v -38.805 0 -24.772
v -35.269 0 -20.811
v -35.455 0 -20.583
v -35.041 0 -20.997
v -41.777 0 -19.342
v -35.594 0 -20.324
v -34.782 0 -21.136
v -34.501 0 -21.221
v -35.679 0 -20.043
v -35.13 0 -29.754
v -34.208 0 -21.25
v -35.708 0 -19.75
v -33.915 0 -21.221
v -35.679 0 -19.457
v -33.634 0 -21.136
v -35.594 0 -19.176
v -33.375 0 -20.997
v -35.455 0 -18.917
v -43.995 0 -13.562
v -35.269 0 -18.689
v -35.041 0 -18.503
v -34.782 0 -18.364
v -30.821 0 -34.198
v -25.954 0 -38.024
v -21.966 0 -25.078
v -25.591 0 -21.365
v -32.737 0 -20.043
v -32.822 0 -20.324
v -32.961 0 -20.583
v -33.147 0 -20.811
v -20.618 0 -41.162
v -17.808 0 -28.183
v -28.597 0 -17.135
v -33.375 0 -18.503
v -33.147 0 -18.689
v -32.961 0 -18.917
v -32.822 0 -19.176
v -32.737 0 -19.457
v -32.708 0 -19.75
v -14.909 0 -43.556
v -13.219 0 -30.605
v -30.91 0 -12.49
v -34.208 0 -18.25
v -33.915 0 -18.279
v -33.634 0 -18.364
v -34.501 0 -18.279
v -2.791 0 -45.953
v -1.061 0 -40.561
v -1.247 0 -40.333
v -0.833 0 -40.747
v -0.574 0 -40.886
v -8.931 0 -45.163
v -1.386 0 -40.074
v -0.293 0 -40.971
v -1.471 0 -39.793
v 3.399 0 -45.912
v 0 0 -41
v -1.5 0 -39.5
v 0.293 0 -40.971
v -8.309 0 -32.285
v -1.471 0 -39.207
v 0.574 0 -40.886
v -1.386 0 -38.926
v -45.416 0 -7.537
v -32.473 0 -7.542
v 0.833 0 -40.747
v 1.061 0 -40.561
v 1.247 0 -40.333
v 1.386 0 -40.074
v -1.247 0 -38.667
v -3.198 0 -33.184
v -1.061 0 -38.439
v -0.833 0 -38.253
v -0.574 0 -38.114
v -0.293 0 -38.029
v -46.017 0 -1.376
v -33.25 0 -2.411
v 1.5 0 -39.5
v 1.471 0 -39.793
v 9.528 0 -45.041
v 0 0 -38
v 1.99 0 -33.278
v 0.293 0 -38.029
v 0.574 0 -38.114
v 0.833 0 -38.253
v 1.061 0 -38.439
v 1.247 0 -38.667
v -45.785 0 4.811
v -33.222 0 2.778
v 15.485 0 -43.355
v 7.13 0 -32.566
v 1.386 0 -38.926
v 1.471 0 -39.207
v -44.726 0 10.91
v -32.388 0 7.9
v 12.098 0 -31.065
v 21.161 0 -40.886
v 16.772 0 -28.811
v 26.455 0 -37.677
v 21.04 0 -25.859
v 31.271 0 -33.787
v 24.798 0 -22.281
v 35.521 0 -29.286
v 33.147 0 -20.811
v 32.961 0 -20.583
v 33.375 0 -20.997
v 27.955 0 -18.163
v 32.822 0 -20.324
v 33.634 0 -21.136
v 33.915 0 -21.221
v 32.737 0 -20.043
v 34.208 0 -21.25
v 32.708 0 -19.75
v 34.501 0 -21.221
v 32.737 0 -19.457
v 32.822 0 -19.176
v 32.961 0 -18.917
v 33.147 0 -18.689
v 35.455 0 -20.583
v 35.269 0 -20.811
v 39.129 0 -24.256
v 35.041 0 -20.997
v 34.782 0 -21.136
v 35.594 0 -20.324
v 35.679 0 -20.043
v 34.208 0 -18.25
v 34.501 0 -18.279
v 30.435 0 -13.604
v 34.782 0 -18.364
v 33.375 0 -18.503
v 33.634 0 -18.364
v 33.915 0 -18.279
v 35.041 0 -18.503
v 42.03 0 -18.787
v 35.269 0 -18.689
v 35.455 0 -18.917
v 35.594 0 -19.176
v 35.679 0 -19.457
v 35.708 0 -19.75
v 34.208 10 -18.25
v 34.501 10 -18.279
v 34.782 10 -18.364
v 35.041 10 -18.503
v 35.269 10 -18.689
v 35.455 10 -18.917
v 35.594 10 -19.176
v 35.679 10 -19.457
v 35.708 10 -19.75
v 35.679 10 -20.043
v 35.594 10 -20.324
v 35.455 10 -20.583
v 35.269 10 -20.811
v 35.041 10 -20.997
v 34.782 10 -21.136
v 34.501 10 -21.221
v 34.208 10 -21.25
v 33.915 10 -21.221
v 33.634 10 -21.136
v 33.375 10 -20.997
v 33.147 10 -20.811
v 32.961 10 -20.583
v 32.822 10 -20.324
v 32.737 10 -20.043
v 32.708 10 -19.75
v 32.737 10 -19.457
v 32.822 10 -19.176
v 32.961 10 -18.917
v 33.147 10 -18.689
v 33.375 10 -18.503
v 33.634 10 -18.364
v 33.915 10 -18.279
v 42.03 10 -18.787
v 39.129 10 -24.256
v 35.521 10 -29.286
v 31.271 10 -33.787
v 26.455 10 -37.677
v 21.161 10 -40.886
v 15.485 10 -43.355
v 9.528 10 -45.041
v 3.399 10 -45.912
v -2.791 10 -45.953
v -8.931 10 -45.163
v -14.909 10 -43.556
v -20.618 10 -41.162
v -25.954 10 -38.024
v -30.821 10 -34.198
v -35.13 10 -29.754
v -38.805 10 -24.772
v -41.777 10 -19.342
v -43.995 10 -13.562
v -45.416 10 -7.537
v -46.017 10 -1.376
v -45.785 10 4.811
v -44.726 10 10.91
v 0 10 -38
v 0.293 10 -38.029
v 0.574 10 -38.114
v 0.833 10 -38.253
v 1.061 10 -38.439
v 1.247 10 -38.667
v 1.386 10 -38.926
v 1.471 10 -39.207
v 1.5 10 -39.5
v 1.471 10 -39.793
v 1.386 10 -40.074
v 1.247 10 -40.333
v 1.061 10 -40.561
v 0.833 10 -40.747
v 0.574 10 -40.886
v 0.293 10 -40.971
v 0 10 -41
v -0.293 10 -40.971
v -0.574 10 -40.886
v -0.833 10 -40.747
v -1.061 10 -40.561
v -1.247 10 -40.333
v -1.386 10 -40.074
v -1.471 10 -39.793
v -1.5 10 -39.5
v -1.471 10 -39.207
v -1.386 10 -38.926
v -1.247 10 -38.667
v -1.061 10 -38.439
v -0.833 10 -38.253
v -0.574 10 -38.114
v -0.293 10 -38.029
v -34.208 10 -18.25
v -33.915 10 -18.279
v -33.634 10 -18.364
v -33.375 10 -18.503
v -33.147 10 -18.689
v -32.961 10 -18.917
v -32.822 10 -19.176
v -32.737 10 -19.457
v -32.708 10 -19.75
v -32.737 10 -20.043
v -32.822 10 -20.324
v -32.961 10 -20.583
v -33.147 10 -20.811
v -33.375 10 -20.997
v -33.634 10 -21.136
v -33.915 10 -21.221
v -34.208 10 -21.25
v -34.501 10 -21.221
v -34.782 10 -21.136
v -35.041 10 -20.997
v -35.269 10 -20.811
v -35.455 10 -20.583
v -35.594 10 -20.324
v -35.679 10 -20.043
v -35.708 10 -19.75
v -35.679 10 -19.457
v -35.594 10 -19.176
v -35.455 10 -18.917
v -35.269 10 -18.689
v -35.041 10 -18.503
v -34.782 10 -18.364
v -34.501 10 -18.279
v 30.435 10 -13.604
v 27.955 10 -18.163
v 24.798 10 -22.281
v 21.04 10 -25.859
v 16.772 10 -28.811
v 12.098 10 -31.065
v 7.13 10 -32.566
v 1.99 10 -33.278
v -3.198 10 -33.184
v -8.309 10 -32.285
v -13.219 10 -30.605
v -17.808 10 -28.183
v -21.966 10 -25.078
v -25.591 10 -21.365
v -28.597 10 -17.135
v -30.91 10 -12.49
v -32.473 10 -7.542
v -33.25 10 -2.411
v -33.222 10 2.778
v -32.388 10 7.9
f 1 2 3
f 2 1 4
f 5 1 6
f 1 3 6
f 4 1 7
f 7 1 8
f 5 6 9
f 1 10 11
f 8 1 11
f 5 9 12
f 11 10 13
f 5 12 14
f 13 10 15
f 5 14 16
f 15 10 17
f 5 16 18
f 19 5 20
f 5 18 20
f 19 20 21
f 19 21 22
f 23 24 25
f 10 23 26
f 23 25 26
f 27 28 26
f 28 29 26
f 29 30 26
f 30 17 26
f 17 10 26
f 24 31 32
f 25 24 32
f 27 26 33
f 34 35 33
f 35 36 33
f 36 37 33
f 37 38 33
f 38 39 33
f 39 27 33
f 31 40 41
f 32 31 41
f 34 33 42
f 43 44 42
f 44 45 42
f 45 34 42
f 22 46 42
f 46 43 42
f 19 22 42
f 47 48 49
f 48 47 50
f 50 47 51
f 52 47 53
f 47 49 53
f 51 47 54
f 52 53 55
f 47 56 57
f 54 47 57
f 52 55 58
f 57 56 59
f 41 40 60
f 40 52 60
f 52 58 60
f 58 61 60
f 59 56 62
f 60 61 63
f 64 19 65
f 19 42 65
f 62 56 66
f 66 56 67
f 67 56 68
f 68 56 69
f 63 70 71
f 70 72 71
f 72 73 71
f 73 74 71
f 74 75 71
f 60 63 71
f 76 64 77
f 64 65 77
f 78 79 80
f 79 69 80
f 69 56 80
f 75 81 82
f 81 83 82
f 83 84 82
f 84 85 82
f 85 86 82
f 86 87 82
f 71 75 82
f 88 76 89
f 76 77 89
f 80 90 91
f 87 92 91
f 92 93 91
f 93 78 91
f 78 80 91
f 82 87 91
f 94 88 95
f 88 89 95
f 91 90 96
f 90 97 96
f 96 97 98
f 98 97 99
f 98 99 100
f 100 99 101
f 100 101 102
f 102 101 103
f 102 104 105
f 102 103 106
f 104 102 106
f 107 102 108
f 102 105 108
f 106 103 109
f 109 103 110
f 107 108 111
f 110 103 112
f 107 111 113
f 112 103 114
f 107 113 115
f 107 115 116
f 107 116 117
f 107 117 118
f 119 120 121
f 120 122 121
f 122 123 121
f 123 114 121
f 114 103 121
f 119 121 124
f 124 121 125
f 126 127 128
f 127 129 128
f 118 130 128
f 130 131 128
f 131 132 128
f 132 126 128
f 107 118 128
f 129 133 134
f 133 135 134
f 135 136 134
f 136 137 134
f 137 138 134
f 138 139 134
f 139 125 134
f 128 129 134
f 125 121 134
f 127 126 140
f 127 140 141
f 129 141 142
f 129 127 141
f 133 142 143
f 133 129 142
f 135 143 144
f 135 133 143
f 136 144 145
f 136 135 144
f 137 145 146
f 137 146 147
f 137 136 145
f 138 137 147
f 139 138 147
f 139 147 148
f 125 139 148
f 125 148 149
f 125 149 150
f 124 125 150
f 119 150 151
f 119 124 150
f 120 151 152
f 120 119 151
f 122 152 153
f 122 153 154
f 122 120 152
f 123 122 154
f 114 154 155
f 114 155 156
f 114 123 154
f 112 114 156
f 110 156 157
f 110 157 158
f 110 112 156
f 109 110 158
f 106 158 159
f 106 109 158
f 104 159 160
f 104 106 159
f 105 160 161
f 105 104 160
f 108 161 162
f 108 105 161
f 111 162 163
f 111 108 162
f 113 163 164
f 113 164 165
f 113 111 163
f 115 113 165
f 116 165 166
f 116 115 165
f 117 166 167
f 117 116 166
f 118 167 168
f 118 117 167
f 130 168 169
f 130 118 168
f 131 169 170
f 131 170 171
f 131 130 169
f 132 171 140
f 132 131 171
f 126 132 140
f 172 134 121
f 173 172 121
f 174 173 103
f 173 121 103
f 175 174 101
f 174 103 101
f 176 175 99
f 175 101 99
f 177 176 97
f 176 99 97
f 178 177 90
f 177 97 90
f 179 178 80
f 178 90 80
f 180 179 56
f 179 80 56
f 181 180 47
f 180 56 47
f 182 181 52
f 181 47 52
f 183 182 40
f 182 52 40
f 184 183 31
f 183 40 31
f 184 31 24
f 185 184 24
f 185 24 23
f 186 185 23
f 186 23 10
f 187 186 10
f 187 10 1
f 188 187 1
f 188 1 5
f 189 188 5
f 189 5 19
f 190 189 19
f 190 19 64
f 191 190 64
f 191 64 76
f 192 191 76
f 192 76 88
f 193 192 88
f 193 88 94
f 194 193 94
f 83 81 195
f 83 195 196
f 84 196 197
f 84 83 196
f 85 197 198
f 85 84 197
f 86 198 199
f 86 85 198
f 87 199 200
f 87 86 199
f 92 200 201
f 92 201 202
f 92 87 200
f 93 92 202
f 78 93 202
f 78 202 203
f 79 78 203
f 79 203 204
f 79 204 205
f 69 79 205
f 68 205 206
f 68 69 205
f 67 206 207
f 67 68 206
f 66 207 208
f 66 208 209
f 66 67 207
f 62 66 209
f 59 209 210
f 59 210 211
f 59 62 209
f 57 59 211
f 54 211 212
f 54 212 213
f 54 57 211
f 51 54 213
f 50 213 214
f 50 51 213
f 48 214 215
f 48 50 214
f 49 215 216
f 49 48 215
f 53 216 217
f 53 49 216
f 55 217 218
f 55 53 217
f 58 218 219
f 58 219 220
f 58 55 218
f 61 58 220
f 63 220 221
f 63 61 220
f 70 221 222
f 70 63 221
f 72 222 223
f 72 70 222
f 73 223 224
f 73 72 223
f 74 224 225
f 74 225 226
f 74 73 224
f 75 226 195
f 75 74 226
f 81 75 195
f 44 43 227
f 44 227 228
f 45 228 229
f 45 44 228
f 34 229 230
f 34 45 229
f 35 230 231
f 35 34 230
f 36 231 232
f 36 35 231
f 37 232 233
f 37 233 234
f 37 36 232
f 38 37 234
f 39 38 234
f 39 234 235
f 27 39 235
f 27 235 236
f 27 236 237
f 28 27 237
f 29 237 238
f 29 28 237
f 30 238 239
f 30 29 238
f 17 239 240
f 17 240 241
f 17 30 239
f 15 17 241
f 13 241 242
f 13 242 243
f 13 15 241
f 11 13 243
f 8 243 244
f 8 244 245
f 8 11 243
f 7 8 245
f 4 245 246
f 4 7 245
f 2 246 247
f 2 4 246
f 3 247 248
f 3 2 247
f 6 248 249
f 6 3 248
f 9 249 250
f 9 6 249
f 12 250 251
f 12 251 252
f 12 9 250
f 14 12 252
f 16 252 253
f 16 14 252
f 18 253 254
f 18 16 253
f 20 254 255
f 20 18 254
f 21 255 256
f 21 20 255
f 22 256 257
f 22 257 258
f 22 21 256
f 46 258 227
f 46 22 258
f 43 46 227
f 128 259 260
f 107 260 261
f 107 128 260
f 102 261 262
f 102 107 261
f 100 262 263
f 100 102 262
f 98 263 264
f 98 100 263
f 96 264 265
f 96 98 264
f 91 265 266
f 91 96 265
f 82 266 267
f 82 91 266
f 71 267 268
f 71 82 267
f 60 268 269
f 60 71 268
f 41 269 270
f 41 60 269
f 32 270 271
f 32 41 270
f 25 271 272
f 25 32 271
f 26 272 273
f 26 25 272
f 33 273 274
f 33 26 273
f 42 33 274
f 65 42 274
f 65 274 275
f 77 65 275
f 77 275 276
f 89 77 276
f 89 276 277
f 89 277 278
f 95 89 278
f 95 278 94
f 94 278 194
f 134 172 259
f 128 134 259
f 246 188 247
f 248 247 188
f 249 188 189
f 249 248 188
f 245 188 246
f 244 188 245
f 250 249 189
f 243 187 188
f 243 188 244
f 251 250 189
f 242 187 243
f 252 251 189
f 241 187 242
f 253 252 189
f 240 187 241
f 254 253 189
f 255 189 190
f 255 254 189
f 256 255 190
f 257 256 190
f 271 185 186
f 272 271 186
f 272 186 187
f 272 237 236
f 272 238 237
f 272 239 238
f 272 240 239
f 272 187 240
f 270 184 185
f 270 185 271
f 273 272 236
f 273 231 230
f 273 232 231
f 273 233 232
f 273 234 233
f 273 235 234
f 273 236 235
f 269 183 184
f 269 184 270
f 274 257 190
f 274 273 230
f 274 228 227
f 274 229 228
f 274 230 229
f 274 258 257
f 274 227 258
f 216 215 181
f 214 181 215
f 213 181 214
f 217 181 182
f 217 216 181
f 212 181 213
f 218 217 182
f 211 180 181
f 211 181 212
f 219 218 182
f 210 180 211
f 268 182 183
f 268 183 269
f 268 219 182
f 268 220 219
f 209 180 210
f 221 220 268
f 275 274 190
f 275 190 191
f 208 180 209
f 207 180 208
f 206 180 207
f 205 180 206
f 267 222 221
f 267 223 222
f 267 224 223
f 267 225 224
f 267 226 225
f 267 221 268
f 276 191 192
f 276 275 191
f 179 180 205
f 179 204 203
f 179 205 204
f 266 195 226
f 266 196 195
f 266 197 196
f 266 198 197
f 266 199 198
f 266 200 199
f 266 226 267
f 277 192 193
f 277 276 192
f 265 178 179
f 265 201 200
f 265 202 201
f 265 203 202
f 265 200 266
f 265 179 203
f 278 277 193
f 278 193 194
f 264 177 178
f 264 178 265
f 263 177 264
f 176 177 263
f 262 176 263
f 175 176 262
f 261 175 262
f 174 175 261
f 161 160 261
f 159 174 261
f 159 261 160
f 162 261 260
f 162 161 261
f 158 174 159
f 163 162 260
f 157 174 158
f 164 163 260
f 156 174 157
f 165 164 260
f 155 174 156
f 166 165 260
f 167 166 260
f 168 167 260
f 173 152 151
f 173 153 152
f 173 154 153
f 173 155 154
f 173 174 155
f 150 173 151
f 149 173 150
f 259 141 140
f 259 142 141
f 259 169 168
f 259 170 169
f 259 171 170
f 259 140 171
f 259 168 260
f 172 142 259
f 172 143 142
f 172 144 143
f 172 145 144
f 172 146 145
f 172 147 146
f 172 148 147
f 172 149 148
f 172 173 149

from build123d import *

# Parameters (mm, degrees)
SKETCH1_R           = 46.0375
SKETCH1_R_2         = 1.5
SKETCH1_R_3         = 33.3375
BOSS_EXTRUDE1_DEPTH = 10
CUT_EXTRUDE1_DEPTH  = 66.870348508


with BuildPart() as part:
    # Sketch1 → Boss-Extrude1 (new body)
    with BuildSketch(Plane(origin=(0, 0, 0), x_dir=(1, 0, 0), z_dir=(0, 1, 0))):
        with Locations(Location((0, 0, 0), (0, 0, 270))):
            Circle(SKETCH1_R)
        with Locations(Location((0, 39.5, 0), (0, 0, 270))):
            Circle(SKETCH1_R_2, mode=Mode.SUBTRACT)
        with Locations(Location((34.208003449, 19.75, 0), (0, 0, 270))):
            Circle(SKETCH1_R_2, mode=Mode.SUBTRACT)
        with Locations(Location((34.208003449, -19.75, 0), (0, 0, 270))):
            Circle(SKETCH1_R_2, mode=Mode.SUBTRACT)
        with Locations(Location((0, -39.5, 0), (0, 0, 270))):
            Circle(SKETCH1_R_2, mode=Mode.SUBTRACT)
        with Locations(Location((-34.208003449, -19.75, 0), (0, 0, 270))):
            Circle(SKETCH1_R_2, mode=Mode.SUBTRACT)
        with Locations(Location((-34.208003449, 19.75, 0), (0, 0, 270))):
            Circle(SKETCH1_R_2, mode=Mode.SUBTRACT)
        with Locations(Location((0, 0, 0), (0, 0, 270))):
            Circle(SKETCH1_R_3, mode=Mode.SUBTRACT)
    extrude(amount=BOSS_EXTRUDE1_DEPTH)

    # Sketch2 → Cut-Extrude1 (cut, through all)
    with BuildSketch(Plane(origin=(0, 10, 0), x_dir=(1, 0, 0), z_dir=(0, 1, 0))):
        with BuildLine():
            Line((0, 0), (-44.72616408, -10.909704529))
            ThreePointArc((-44.72616408, -10.909704529), (14.909439021, -43.556400613), (42.029747553, 18.787009525))
            Line((42.029747553, 18.787009525), (0, 0))
        make_face()
    extrude(amount=-CUT_EXTRUDE1_DEPTH, mode=Mode.SUBTRACT)


solid = part.part
